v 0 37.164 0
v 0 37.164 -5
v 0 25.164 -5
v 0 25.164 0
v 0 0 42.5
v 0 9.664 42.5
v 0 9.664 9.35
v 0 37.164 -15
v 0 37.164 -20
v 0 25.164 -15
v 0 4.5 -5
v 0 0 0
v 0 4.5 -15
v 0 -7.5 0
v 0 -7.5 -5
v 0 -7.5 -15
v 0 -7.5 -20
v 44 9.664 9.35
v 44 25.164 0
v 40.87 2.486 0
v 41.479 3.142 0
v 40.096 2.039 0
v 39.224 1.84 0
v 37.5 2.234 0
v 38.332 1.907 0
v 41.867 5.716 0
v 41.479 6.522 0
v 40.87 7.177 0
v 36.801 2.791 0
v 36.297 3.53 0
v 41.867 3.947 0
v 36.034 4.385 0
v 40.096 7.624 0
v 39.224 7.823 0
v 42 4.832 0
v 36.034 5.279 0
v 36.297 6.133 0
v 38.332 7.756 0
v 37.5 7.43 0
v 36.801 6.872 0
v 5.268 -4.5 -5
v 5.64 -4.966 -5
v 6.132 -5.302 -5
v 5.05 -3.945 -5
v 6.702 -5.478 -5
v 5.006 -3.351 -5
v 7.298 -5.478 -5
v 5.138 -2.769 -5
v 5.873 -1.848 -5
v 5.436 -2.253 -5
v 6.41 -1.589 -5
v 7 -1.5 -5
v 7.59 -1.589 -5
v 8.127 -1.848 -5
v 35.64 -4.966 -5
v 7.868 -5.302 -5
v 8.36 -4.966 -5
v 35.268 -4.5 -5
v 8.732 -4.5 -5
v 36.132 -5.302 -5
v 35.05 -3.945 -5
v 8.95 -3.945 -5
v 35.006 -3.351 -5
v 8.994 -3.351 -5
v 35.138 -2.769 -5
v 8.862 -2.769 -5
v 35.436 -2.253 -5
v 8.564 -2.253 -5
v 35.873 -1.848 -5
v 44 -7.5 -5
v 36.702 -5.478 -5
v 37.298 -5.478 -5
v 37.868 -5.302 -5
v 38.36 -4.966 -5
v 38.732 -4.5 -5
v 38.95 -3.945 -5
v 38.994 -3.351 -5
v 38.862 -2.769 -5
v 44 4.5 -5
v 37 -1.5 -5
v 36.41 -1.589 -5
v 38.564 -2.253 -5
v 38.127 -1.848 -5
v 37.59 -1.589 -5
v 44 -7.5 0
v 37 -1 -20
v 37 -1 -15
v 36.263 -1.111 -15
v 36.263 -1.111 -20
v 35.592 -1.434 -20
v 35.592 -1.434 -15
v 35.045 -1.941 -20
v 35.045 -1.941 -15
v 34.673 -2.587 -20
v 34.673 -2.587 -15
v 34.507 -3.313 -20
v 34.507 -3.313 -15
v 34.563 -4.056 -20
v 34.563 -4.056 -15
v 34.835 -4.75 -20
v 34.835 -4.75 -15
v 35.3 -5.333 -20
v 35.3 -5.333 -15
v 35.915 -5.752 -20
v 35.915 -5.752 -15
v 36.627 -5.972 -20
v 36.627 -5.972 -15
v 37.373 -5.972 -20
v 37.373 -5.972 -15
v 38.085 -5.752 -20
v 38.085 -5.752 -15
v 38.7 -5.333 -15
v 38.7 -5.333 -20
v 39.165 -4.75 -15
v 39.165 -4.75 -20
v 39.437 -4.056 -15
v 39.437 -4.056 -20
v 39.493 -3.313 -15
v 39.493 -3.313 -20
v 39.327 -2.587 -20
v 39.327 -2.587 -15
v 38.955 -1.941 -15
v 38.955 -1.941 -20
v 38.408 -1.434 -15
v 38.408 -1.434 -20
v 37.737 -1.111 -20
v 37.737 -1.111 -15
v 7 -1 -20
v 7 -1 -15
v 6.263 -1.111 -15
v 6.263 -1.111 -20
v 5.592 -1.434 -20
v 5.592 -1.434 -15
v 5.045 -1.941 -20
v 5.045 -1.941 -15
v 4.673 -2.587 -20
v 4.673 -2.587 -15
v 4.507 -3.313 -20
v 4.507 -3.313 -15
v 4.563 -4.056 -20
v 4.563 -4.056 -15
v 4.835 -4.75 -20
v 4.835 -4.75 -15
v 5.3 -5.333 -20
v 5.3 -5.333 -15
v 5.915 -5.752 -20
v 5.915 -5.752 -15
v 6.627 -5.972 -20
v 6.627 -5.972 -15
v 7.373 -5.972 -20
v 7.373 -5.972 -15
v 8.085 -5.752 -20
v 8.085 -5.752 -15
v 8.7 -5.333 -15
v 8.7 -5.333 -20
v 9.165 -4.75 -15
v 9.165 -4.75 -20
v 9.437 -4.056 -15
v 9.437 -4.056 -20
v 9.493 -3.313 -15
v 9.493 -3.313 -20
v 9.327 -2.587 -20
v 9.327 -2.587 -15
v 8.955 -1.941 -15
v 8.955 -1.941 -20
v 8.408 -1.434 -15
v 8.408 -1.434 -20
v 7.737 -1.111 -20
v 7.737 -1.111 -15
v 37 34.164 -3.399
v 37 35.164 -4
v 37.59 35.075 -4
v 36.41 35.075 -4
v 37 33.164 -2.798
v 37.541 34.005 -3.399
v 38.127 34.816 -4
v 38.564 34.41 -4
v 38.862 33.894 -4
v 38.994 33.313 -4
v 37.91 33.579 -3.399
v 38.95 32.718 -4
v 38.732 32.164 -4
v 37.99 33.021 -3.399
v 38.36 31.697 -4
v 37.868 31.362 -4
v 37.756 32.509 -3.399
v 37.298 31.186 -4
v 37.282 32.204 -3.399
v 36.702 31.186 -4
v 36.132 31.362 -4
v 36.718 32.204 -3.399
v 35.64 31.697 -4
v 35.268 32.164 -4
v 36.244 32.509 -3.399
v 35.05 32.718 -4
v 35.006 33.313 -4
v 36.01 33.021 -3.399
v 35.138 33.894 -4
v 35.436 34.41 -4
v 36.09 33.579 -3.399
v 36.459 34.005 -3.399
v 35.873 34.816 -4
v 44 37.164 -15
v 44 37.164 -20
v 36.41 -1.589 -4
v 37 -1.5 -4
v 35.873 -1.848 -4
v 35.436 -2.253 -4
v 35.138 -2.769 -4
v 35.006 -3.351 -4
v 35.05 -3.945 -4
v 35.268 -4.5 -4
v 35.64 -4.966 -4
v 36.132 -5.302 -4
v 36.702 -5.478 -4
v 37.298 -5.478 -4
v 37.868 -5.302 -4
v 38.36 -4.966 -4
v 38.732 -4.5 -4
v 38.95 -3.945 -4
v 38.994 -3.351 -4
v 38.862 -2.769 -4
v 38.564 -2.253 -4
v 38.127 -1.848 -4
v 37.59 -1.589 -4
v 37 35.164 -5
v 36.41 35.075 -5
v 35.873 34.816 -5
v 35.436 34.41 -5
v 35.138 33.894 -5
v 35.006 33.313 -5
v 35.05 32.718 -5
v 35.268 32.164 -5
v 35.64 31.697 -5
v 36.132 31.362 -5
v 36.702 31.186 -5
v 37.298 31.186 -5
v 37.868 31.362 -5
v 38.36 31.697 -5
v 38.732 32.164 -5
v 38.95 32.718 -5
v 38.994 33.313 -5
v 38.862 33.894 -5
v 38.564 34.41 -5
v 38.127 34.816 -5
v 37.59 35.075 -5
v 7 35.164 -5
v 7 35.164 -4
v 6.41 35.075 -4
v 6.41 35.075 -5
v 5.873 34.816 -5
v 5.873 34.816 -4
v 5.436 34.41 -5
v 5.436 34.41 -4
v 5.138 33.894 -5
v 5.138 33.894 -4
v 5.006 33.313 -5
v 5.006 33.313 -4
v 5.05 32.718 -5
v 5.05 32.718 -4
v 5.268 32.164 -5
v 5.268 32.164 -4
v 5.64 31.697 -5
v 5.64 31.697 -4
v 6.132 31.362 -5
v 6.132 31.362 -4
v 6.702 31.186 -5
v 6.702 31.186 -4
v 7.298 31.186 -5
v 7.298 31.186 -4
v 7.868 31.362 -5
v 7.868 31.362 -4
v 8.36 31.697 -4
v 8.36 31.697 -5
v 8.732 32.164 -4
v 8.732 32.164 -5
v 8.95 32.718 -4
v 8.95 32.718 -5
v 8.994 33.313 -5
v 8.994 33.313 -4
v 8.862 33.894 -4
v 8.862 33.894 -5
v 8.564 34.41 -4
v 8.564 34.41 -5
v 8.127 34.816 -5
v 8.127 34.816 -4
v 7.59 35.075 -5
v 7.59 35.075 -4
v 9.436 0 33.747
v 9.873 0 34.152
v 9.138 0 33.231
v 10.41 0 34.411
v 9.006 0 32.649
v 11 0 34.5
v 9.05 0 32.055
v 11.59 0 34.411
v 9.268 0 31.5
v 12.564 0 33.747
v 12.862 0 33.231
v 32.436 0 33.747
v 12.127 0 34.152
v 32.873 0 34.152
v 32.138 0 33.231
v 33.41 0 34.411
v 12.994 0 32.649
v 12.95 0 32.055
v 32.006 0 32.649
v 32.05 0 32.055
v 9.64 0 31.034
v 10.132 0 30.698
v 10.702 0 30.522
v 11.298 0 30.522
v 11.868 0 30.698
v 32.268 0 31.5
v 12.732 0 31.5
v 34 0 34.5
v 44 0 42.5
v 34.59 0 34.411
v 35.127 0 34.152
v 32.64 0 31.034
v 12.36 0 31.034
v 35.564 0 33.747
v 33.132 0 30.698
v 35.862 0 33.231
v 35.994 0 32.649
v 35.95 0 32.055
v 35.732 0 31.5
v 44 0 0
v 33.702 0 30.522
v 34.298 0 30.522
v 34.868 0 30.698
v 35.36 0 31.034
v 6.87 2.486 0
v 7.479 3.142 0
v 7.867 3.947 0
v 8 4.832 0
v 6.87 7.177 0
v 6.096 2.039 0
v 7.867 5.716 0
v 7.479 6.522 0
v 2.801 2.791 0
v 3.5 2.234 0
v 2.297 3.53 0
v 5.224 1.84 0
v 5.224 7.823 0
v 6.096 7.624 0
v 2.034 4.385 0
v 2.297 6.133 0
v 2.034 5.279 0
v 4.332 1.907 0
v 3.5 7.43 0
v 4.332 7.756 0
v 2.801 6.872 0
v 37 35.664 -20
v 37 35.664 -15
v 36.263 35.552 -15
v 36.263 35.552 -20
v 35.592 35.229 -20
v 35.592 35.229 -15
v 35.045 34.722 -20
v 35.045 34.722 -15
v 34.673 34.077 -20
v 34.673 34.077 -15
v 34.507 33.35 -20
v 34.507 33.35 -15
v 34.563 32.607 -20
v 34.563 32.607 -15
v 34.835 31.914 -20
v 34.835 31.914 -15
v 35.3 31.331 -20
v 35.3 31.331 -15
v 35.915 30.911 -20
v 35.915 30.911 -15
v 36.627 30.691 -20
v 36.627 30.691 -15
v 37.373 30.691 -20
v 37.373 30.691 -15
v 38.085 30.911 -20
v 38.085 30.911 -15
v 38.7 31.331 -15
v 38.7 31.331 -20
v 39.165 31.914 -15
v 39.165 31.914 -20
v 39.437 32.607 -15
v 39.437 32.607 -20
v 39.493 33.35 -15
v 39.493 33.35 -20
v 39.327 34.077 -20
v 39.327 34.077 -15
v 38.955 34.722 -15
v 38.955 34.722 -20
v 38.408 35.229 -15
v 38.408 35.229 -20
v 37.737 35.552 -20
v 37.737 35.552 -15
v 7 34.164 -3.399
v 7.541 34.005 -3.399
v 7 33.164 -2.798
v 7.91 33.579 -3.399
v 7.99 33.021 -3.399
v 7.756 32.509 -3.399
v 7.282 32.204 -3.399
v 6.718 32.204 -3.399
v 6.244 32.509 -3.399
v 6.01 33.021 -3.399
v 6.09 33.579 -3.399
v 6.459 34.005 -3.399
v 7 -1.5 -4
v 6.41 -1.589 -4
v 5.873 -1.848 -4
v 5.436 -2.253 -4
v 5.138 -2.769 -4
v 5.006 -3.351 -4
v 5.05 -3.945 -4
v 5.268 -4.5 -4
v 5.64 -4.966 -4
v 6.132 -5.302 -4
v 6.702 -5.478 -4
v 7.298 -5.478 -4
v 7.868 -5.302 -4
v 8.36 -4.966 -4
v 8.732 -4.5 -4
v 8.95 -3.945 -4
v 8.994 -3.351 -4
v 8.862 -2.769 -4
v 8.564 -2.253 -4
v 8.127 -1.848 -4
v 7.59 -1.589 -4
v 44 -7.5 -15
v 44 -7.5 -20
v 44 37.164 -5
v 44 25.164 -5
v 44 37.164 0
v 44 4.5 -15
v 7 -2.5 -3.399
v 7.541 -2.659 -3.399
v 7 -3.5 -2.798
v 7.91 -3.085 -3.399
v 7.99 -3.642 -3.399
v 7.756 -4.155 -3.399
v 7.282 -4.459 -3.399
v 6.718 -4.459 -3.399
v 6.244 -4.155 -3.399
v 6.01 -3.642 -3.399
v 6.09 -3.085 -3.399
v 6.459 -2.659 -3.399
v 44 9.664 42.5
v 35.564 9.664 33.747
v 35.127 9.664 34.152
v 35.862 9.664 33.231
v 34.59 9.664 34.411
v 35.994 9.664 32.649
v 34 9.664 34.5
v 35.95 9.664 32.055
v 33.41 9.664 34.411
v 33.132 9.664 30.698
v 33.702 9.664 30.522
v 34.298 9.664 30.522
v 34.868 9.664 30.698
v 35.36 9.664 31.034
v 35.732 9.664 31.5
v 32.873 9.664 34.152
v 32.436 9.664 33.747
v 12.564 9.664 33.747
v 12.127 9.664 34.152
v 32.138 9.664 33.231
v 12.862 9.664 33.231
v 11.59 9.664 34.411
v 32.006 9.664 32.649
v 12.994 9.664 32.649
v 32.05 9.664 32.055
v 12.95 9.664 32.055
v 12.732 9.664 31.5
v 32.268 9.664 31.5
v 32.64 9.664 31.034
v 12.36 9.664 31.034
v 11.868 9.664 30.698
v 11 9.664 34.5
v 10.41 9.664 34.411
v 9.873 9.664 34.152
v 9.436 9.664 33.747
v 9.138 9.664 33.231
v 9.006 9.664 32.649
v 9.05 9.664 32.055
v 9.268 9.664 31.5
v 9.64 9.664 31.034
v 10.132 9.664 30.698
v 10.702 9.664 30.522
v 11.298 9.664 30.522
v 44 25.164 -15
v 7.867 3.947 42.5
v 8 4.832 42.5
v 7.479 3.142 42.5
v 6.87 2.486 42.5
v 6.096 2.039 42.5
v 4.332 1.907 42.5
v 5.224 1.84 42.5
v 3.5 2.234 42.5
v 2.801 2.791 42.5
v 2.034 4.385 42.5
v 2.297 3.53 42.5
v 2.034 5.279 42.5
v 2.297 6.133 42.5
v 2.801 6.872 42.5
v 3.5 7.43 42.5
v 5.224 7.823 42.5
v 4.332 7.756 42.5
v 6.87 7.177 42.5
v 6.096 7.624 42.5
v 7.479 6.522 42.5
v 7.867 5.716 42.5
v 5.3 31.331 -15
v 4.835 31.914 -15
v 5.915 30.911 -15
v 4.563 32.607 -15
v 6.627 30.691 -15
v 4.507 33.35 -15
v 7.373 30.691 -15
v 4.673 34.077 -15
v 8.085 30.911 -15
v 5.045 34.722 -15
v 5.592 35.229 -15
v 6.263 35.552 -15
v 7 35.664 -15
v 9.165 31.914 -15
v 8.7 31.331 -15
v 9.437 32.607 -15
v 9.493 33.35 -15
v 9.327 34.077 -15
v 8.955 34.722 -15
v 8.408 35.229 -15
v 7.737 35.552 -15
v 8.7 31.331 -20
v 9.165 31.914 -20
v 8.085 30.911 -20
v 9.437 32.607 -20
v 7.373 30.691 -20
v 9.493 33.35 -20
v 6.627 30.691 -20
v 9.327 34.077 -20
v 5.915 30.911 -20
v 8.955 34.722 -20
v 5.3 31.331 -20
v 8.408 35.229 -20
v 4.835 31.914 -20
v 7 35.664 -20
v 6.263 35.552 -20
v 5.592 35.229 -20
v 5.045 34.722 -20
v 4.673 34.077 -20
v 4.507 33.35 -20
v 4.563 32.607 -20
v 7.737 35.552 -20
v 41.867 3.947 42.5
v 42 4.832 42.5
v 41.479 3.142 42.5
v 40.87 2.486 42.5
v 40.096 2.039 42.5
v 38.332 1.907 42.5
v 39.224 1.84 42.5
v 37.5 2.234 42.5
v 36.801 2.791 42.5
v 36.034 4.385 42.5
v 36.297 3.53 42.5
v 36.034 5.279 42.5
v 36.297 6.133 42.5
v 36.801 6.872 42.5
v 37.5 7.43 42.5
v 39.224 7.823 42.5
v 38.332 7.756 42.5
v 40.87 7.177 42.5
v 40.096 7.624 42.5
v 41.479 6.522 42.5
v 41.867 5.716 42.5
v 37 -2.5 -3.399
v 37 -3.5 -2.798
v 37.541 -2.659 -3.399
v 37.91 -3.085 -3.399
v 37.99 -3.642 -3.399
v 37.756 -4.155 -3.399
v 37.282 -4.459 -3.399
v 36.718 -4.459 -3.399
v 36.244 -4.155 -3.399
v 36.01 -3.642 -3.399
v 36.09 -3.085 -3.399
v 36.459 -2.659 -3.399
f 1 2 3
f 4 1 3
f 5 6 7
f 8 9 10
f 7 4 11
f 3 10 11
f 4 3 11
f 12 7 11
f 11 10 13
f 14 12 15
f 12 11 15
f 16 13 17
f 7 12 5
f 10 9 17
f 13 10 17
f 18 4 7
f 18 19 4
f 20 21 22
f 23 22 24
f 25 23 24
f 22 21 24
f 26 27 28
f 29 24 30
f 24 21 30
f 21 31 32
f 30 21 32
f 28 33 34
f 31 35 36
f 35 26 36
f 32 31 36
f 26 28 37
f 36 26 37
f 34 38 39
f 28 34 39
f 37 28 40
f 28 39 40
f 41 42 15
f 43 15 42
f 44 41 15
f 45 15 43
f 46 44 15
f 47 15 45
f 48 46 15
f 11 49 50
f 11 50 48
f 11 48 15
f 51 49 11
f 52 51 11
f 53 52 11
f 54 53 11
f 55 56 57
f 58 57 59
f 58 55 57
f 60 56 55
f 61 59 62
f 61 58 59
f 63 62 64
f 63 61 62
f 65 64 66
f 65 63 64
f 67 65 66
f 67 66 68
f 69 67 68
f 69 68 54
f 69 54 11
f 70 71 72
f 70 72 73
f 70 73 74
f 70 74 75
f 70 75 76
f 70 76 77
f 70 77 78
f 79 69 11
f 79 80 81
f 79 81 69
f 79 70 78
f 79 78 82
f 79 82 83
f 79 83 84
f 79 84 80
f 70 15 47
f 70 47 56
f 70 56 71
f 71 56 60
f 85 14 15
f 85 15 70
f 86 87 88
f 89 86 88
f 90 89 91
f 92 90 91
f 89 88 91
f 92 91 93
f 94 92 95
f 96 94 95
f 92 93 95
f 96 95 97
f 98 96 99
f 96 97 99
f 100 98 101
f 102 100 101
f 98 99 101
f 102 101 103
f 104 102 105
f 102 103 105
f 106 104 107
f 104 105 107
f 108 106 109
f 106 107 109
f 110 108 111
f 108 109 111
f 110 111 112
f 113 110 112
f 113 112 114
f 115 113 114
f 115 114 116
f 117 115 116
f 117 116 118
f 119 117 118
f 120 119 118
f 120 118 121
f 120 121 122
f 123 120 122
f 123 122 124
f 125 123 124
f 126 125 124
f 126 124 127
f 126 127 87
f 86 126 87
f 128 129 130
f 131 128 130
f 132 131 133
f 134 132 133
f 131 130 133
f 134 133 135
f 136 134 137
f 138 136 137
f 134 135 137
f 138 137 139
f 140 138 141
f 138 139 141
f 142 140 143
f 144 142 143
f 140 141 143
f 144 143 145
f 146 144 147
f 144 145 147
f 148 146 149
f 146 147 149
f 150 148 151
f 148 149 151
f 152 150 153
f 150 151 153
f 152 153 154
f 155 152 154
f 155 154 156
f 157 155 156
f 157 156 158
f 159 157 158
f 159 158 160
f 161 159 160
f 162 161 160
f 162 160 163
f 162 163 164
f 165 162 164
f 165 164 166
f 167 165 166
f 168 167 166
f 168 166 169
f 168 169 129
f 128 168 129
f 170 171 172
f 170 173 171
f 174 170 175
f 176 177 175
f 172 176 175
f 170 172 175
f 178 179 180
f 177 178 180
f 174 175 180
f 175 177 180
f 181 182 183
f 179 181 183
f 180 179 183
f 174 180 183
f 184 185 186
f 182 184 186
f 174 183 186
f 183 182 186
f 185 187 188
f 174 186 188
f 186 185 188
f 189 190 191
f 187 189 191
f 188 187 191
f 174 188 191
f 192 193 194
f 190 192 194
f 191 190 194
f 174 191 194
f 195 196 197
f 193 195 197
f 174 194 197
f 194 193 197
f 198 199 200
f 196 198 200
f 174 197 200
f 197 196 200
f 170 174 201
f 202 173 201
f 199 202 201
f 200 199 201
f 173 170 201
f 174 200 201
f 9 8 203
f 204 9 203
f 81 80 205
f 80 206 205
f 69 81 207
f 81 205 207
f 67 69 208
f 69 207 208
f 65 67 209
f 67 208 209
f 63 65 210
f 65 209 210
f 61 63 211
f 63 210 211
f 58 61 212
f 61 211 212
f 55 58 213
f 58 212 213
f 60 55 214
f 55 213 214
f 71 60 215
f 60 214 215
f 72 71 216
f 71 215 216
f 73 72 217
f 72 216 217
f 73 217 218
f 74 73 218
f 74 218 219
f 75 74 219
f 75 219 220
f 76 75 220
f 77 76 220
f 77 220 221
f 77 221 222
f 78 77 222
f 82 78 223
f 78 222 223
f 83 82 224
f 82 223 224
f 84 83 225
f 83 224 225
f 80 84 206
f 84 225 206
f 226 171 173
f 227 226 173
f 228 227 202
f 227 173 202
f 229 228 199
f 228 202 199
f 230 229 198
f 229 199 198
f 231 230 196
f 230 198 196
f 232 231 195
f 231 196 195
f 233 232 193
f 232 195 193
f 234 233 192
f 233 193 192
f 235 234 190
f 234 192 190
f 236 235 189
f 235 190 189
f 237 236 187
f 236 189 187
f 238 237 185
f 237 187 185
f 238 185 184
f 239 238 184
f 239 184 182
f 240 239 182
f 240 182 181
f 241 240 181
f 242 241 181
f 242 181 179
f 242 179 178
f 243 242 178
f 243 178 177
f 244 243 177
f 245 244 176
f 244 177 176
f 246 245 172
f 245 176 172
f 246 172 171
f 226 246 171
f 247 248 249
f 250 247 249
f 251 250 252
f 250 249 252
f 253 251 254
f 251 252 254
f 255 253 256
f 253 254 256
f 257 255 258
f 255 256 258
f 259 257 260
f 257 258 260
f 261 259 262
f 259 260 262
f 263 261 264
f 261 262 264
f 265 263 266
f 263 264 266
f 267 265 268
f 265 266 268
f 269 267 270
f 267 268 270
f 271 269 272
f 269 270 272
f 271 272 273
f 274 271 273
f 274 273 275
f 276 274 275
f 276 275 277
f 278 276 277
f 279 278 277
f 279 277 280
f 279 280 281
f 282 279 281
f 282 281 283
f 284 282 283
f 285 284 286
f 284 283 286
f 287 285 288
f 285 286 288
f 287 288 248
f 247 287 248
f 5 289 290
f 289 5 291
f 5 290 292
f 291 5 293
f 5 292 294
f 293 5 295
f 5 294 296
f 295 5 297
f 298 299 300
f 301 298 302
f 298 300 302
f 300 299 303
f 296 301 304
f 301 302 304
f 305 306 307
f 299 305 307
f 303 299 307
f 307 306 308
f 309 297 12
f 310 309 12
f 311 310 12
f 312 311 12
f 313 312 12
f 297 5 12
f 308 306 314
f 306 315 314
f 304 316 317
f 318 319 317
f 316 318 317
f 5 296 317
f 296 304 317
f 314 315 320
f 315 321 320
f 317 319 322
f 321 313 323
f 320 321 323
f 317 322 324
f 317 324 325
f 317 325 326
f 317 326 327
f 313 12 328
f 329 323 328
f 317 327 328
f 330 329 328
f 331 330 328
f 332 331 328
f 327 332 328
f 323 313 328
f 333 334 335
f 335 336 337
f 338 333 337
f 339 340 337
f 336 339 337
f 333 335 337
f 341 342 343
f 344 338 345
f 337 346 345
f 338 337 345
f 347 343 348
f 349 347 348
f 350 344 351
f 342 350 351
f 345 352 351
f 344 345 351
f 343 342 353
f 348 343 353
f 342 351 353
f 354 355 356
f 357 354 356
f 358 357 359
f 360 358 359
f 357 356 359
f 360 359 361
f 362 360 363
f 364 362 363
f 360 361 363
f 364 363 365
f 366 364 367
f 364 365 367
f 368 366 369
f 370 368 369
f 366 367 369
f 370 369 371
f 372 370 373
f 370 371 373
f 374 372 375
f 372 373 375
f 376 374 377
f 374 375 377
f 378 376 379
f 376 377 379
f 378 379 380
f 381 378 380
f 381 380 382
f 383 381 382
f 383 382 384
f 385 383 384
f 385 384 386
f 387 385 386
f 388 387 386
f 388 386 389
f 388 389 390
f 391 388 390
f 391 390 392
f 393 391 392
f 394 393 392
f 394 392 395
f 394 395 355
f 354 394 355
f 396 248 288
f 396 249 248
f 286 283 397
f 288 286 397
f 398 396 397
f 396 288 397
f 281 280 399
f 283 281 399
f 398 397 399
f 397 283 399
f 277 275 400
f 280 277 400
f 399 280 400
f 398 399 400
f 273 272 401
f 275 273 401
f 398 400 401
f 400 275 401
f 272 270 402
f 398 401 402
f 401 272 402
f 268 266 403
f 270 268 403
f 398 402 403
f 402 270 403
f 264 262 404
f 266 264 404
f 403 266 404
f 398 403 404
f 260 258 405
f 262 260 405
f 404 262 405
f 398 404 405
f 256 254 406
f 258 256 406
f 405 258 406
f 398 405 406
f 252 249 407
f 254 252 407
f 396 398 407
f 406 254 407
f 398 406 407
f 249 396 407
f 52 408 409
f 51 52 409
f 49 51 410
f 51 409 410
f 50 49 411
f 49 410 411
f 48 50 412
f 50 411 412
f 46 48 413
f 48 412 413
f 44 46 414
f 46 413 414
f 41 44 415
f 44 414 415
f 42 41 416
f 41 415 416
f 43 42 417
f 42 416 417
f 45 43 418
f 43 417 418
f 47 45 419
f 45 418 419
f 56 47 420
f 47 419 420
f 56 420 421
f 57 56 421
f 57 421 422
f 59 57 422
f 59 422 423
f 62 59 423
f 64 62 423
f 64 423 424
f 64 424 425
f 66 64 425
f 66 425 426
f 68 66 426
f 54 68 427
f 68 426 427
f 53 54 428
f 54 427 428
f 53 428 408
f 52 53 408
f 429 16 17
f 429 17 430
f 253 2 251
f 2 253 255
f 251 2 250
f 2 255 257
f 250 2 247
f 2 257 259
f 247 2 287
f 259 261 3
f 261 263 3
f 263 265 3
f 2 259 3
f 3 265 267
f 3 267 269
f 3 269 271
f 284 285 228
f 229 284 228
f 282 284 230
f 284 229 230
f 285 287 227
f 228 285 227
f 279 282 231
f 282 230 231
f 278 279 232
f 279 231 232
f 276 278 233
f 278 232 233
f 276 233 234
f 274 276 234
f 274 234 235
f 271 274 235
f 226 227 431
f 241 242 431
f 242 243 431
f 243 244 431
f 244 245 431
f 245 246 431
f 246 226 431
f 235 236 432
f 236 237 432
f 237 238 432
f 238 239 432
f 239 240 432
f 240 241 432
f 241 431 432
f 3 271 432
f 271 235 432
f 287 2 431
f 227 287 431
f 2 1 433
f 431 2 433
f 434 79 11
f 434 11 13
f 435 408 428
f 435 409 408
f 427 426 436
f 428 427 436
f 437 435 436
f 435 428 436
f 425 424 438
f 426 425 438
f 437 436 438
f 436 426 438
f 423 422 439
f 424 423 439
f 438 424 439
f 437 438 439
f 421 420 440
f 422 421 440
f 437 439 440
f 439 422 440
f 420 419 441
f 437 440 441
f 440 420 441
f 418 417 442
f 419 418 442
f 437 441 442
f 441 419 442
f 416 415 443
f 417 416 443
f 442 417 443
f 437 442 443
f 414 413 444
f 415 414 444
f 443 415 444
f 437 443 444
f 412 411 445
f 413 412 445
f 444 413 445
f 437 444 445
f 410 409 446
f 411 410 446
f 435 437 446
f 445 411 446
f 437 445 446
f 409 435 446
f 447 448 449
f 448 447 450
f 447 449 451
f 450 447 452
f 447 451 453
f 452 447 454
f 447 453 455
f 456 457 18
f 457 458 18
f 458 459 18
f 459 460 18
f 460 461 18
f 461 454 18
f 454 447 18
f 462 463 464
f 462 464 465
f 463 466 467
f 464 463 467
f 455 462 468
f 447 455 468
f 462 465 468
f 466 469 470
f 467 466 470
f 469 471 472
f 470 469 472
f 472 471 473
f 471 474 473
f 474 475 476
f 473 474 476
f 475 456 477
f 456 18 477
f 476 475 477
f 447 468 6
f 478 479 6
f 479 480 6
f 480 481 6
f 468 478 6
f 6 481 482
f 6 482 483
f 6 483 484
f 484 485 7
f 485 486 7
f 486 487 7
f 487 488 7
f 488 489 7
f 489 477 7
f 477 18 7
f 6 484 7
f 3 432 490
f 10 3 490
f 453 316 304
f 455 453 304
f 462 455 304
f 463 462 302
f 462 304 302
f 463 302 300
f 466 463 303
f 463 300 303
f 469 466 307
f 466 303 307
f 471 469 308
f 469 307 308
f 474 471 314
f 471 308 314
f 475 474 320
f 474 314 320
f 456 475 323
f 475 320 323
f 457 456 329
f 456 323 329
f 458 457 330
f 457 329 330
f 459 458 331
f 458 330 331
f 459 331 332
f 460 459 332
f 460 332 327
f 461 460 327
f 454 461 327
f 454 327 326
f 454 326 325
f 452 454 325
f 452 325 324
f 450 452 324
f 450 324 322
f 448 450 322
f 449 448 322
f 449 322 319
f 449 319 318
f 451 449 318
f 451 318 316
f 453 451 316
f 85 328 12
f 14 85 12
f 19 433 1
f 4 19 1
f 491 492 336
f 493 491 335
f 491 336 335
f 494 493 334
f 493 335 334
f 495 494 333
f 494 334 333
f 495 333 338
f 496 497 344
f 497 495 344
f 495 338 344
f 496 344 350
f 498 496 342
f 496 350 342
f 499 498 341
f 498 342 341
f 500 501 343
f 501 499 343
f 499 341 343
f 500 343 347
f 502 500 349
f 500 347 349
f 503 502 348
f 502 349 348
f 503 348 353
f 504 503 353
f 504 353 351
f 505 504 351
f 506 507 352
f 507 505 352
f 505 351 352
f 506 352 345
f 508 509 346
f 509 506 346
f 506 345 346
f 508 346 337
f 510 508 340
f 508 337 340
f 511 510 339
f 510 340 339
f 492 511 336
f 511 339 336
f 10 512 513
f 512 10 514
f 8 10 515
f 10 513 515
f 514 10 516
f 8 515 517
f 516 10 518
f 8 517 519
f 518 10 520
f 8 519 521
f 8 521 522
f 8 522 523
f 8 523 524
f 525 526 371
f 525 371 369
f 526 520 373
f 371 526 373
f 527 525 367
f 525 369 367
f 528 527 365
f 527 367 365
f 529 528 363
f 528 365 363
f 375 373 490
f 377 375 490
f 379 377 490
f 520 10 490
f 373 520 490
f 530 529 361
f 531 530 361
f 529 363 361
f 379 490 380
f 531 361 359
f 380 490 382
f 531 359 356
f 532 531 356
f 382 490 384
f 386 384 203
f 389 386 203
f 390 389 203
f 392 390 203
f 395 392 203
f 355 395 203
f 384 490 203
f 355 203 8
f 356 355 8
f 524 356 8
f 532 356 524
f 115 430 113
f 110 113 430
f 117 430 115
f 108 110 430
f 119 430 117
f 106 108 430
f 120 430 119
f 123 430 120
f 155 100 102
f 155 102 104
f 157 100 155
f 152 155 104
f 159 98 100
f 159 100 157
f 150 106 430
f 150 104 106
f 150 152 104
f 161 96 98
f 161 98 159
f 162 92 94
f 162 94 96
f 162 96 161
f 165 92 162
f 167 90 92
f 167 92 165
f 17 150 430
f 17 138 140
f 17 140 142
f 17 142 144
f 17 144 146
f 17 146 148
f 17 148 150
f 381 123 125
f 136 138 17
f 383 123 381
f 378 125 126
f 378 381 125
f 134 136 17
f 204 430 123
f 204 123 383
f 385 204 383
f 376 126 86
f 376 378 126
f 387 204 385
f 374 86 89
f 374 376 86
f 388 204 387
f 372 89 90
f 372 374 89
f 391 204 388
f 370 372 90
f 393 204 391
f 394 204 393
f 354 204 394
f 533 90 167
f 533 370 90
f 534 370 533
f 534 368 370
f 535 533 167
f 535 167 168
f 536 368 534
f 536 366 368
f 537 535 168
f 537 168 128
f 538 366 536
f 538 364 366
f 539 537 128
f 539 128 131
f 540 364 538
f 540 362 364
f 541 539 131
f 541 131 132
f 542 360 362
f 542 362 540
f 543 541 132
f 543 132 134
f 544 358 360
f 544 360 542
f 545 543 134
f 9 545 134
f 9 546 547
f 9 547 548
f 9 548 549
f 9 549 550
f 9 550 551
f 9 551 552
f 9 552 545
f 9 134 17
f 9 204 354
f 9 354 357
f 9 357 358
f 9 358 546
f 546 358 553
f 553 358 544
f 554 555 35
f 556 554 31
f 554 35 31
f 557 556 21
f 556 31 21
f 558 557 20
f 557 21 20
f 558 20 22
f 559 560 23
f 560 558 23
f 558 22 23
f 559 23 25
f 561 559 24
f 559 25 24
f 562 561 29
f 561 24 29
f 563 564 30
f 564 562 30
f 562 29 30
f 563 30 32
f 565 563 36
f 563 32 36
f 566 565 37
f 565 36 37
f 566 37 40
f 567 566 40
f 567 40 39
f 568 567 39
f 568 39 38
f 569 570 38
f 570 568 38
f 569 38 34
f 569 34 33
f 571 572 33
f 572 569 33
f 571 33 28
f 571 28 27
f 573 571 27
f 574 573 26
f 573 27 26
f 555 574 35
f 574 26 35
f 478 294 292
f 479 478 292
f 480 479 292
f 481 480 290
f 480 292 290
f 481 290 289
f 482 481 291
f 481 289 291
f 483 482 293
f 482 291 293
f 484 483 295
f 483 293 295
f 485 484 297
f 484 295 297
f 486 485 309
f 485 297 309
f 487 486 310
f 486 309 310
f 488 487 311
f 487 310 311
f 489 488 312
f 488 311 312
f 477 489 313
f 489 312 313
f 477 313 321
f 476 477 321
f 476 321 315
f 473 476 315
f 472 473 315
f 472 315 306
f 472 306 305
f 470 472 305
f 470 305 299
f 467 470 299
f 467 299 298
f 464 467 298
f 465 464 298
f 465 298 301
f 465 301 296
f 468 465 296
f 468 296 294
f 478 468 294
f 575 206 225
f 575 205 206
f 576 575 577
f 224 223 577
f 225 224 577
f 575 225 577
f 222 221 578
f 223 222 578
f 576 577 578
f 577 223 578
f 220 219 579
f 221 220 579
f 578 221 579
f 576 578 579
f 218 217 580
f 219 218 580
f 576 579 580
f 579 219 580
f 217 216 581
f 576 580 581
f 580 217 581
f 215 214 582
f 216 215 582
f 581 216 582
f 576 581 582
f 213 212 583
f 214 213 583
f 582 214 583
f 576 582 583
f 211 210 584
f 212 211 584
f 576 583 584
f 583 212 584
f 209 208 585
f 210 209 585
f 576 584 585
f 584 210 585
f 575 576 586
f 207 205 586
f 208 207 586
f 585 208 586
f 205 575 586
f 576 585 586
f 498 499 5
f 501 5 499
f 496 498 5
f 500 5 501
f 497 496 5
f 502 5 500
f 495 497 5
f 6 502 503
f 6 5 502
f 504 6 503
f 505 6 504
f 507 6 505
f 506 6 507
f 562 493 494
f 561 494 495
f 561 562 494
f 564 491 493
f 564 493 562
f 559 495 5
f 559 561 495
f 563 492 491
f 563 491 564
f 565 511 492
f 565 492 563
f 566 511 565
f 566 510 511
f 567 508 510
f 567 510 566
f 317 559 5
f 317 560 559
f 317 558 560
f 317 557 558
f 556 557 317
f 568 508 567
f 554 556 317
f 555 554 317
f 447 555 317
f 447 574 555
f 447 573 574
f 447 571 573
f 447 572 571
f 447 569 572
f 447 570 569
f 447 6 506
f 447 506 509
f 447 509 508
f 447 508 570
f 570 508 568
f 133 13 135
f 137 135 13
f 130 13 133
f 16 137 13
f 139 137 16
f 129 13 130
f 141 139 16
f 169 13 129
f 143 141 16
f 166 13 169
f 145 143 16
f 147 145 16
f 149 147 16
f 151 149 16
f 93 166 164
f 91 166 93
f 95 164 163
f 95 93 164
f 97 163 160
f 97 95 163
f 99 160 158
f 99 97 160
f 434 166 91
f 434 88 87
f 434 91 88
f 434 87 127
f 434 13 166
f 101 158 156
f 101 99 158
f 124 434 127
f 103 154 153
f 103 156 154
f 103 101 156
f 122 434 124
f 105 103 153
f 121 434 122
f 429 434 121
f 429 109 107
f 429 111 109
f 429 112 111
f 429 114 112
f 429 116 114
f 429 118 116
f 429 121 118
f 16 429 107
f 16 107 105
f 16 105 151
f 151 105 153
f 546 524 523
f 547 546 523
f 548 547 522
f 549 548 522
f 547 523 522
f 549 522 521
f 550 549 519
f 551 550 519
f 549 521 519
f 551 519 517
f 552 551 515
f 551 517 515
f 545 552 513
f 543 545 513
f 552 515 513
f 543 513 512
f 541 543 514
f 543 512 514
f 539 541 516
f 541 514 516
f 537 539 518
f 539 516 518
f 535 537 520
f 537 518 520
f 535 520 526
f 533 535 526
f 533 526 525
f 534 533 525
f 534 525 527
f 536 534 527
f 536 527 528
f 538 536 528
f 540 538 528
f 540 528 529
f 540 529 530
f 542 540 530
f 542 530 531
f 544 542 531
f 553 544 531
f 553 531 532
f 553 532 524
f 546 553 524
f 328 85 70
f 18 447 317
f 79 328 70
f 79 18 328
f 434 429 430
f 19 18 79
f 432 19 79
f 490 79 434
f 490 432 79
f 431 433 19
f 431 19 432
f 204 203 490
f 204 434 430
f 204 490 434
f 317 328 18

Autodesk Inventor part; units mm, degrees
ref_plane "YZ Plane" through (0, 0, 0) normal (1, 0, 0) x (0, 1, 0)
ref_plane "XZ Plane" through (0, 0, 0) normal (0, 1, 0) x (-1, 0, 0)
sketch "Sketch1" plane through (0, 0, 0) normal (0, 0, 1) x (1, 0, 0)
  line L0 (0, 0) -> (44, 0)
  line L1 (44, 0) -> (44, 9.6635)
  line L2 (44, 9.6635) -> (0, 9.6635)
  line L3 (0, 9.6635) -> (0, 0)
  circle A0 centre (5, 4.8317) radius 3
  circle A1 centre (39, 4.8317) radius 3
  dimension "d0" = 6
  dimension "d1" = 6
  dimension "d2" = 34
  dimension "d3" = 44
  dimension "d4" = 5
extrude "Extrusion1" add sketch "Sketch1" along normal blind 42.5
sketch "Sketch2" plane through (0, 9.6635, 0) normal (0, 1, 0) x (1, 0, 0)
  line L0 (44, 0) -> (0, 0) projected
  line L1 (0, 0) -> (0, -42.5) projected
  line L2 (8, -42.5) -> (42, -42.5) projected
  point P0 (11, -32.5)
  point P1 (0, -40.5)
  dimension "d17" = 10
  dimension "d18" = 11
hole "Hole1" at (11, 9.6635, 32.5) direction (0, -1, 0) diameter 4 depth 10 tip angle 118
sketch "Sketch3" plane through (0, 9.6635, 0) normal (0, 1, 0) x (1, 0, 0)
  line L0 (8, -42.5) -> (42, -42.5) projected
  line L1 (44, 0) -> (44, -42.5) projected
  point P0 (0, 0)
  point P1 (34, -32.5)
  point P2 (44, -40.5)
  dimension "d19" = 10
  dimension "d20" = 10
hole "Hole2" at (34, 9.6635, 32.5) direction (0, -1, 0) diameter 4 depth 10 tip angle 118
sketch "Sketch4" plane through (0, 0, 0) normal (0, 0, -1) x (-1, 0, 0)
  line L0 (0, -7.5) -> (-44, -7.5)
  line L1 (-44, -7.5) -> (-44, 0)
  line L2 (-44, 0) -> (0, 0)
  line L3 (0, 0) -> (0, -7.5)
  line L4 (-44, 9.6635) -> (0, 9.6635)
  line L5 (0, 9.6635) -> (0, 37.1635)
  line L6 (0, 37.1635) -> (-44, 37.1635)
  line L7 (-44, 37.1635) -> (-44, 9.6635)
  circle A0 centre (-39, 4.8317) radius 3 projected
  circle A1 centre (-5, 4.8317) radius 3 projected
  line L8 (0, 0) -> (-44, 0) projected
  line L9 (0, 9.6635) -> (0, 0) projected
  line L10 (-44, 9.6635) -> (0, 9.6635) projected
  line L11 (-44, 0) -> (-44, 9.6635) projected
  dimension "d28" = 7.5
  dimension "d29" = 27.5
extrude "Extrusion2" add sketch "Sketch4" along normal blind 20
sketch "Sketch5" plane through (0, 0, -20) normal (0, 0, -1) x (-1, 0, 0)
  arc A0 (-8, 4.8317) -> (-8, 4.8317) centre (-5, 4.8317) ccw projected
  circle A1 centre (-5, 4.8317) radius 3
  circle A2 centre (-39, 4.8317) radius 3 projected
  circle A3 centre (-39, 4.8317) radius 3
  point P0 (0, 0)
extrude "Extrusion3" add sketch "Sketch5" against normal blind 20
ref_plane "Work Plane2" through (44, 0, 40.5) normal (1, 0, 0) x (0, 0, -1)
sketch "Sketch6" plane through (44, 0, 40.5) normal (1, 0, 0) x (0, 0, -1)
  line L0 (55.5, 37.1635) -> (45.5, 37.1635)
  line L1 (45.5, 37.1635) -> (45.5, 25.1635)
  line L2 (45.5, 25.1635) -> (55.5, 25.1635)
  line L3 (55.5, 25.1635) -> (55.5, 37.1635)
  line L4 (60.5, 37.1635) -> (60.5, -7.5) projected
  line L5 (40.5, -7.5) -> (60.5, -7.5) projected
  line L6 (55.5, -7.5) -> (45.5, -7.5)
  line L7 (45.5, -7.5) -> (45.5, 4.5)
  line L8 (45.5, 4.5) -> (55.5, 4.5)
  line L9 (55.5, 4.5) -> (55.5, -7.5)
  line L10 (40.5, 37.1635) -> (60.5, 37.1635) projected
  point P0 (40.5, 0)
  dimension "d34" = 10
  dimension "d35" = 5
  dimension "d36" = 12
  dimension "d37" = 12
  dimension "d55" = 0
extrude "Extrusion4" cut sketch "Sketch6" against normal through all
sketch "Sketch7" plane through (0, 0, -20) normal (0, 0, -1) x (-1, 0, 0)
  line L0 (0, 0) -> (-44, 0) projected
  line L1 (0, 37.1635) -> (-44, 37.1635) projected
  line L2 (-44, -7.5) -> (0, -7.5) projected
  line L3 (0, -7.5) -> (0, 37.1635) projected
  line L4 (-44, 37.1635) -> (-44, -7.5) projected
  point P0 (-37, -3.5)
  point P1 (-7, 33.1635)
  point P2 (-37, 33.1635)
  point P3 (-7, -3.5)
  dimension "d40" = 4
  dimension "d41" = 4
  dimension "d42" = 4
  dimension "d43" = 4
  dimension "d44" = 7
  dimension "d45" = 7
  dimension "d46" = 7
  dimension "d47" = 7
hole "Hole3" at (37, -3.5, -20) at (7, 33.1635, -20) at (37, 33.1635, -20) at (7, -3.5, -20) direction (0, 0, 1) diameter 4 depth 16 tip angle 118 counterbore diameter 5 counterbore depth 6
sketch "Sketch8" plane through (0, 0, 0) normal (0, 0, 1) x (1, 0, 0)
  line L0 (44, 25.1635) -> (0, 25.1635) projected
  line L1 (0, 9.6635) -> (5, 9.6635)
  line L2 (5, 9.6635) -> (5, 25.1635)
  line L3 (5, 25.1635) -> (0, 25.1635)
  line L4 (0, 25.1635) -> (0, 9.6635)
  point P0 (0, 0)
  dimension "d56" = 5
extrude "Extrusion5" add sketch "Sketch8" along normal blind 15.5
chamfer "Chamfer1" distance 15.5 angle 45 1 edges at (2.5, 25.1635, 15.5)
sketch "Sketch9" plane through (5, 9.6635, 0) normal (1, 0, 0) x (0, 0, -1)
  line L0 (-15.5, 0) -> (0, 15.5) projected
  line L1 (0, 0) -> (-15.5, 0) projected
  line L2 (0, 15.5) -> (0, 0) projected
  point P0 (0, -9.6635)
extrude "Extrusion6" add sketch "Sketch9" along normal up to surface (39 mm away)
sketch "Sketch11" plane through (44, 0, 42.5) normal (1, 0, 0) x (0, 0, -1)
  line L0 (42.5, 25.1635) -> (33.1498, 9.6635)
  line L1 (33.1498, 9.6635) -> (27, 9.6635)
  line L2 (27, 9.6635) -> (42.5, 25.1635)
  line L3 (42.5, 25.1635) -> (27, 9.6635) projected
  point P0 (42.5, 0)
extrude "Extrusion7" cut sketch "Sketch11" against normal through all
properties part number "X smooth mount"
